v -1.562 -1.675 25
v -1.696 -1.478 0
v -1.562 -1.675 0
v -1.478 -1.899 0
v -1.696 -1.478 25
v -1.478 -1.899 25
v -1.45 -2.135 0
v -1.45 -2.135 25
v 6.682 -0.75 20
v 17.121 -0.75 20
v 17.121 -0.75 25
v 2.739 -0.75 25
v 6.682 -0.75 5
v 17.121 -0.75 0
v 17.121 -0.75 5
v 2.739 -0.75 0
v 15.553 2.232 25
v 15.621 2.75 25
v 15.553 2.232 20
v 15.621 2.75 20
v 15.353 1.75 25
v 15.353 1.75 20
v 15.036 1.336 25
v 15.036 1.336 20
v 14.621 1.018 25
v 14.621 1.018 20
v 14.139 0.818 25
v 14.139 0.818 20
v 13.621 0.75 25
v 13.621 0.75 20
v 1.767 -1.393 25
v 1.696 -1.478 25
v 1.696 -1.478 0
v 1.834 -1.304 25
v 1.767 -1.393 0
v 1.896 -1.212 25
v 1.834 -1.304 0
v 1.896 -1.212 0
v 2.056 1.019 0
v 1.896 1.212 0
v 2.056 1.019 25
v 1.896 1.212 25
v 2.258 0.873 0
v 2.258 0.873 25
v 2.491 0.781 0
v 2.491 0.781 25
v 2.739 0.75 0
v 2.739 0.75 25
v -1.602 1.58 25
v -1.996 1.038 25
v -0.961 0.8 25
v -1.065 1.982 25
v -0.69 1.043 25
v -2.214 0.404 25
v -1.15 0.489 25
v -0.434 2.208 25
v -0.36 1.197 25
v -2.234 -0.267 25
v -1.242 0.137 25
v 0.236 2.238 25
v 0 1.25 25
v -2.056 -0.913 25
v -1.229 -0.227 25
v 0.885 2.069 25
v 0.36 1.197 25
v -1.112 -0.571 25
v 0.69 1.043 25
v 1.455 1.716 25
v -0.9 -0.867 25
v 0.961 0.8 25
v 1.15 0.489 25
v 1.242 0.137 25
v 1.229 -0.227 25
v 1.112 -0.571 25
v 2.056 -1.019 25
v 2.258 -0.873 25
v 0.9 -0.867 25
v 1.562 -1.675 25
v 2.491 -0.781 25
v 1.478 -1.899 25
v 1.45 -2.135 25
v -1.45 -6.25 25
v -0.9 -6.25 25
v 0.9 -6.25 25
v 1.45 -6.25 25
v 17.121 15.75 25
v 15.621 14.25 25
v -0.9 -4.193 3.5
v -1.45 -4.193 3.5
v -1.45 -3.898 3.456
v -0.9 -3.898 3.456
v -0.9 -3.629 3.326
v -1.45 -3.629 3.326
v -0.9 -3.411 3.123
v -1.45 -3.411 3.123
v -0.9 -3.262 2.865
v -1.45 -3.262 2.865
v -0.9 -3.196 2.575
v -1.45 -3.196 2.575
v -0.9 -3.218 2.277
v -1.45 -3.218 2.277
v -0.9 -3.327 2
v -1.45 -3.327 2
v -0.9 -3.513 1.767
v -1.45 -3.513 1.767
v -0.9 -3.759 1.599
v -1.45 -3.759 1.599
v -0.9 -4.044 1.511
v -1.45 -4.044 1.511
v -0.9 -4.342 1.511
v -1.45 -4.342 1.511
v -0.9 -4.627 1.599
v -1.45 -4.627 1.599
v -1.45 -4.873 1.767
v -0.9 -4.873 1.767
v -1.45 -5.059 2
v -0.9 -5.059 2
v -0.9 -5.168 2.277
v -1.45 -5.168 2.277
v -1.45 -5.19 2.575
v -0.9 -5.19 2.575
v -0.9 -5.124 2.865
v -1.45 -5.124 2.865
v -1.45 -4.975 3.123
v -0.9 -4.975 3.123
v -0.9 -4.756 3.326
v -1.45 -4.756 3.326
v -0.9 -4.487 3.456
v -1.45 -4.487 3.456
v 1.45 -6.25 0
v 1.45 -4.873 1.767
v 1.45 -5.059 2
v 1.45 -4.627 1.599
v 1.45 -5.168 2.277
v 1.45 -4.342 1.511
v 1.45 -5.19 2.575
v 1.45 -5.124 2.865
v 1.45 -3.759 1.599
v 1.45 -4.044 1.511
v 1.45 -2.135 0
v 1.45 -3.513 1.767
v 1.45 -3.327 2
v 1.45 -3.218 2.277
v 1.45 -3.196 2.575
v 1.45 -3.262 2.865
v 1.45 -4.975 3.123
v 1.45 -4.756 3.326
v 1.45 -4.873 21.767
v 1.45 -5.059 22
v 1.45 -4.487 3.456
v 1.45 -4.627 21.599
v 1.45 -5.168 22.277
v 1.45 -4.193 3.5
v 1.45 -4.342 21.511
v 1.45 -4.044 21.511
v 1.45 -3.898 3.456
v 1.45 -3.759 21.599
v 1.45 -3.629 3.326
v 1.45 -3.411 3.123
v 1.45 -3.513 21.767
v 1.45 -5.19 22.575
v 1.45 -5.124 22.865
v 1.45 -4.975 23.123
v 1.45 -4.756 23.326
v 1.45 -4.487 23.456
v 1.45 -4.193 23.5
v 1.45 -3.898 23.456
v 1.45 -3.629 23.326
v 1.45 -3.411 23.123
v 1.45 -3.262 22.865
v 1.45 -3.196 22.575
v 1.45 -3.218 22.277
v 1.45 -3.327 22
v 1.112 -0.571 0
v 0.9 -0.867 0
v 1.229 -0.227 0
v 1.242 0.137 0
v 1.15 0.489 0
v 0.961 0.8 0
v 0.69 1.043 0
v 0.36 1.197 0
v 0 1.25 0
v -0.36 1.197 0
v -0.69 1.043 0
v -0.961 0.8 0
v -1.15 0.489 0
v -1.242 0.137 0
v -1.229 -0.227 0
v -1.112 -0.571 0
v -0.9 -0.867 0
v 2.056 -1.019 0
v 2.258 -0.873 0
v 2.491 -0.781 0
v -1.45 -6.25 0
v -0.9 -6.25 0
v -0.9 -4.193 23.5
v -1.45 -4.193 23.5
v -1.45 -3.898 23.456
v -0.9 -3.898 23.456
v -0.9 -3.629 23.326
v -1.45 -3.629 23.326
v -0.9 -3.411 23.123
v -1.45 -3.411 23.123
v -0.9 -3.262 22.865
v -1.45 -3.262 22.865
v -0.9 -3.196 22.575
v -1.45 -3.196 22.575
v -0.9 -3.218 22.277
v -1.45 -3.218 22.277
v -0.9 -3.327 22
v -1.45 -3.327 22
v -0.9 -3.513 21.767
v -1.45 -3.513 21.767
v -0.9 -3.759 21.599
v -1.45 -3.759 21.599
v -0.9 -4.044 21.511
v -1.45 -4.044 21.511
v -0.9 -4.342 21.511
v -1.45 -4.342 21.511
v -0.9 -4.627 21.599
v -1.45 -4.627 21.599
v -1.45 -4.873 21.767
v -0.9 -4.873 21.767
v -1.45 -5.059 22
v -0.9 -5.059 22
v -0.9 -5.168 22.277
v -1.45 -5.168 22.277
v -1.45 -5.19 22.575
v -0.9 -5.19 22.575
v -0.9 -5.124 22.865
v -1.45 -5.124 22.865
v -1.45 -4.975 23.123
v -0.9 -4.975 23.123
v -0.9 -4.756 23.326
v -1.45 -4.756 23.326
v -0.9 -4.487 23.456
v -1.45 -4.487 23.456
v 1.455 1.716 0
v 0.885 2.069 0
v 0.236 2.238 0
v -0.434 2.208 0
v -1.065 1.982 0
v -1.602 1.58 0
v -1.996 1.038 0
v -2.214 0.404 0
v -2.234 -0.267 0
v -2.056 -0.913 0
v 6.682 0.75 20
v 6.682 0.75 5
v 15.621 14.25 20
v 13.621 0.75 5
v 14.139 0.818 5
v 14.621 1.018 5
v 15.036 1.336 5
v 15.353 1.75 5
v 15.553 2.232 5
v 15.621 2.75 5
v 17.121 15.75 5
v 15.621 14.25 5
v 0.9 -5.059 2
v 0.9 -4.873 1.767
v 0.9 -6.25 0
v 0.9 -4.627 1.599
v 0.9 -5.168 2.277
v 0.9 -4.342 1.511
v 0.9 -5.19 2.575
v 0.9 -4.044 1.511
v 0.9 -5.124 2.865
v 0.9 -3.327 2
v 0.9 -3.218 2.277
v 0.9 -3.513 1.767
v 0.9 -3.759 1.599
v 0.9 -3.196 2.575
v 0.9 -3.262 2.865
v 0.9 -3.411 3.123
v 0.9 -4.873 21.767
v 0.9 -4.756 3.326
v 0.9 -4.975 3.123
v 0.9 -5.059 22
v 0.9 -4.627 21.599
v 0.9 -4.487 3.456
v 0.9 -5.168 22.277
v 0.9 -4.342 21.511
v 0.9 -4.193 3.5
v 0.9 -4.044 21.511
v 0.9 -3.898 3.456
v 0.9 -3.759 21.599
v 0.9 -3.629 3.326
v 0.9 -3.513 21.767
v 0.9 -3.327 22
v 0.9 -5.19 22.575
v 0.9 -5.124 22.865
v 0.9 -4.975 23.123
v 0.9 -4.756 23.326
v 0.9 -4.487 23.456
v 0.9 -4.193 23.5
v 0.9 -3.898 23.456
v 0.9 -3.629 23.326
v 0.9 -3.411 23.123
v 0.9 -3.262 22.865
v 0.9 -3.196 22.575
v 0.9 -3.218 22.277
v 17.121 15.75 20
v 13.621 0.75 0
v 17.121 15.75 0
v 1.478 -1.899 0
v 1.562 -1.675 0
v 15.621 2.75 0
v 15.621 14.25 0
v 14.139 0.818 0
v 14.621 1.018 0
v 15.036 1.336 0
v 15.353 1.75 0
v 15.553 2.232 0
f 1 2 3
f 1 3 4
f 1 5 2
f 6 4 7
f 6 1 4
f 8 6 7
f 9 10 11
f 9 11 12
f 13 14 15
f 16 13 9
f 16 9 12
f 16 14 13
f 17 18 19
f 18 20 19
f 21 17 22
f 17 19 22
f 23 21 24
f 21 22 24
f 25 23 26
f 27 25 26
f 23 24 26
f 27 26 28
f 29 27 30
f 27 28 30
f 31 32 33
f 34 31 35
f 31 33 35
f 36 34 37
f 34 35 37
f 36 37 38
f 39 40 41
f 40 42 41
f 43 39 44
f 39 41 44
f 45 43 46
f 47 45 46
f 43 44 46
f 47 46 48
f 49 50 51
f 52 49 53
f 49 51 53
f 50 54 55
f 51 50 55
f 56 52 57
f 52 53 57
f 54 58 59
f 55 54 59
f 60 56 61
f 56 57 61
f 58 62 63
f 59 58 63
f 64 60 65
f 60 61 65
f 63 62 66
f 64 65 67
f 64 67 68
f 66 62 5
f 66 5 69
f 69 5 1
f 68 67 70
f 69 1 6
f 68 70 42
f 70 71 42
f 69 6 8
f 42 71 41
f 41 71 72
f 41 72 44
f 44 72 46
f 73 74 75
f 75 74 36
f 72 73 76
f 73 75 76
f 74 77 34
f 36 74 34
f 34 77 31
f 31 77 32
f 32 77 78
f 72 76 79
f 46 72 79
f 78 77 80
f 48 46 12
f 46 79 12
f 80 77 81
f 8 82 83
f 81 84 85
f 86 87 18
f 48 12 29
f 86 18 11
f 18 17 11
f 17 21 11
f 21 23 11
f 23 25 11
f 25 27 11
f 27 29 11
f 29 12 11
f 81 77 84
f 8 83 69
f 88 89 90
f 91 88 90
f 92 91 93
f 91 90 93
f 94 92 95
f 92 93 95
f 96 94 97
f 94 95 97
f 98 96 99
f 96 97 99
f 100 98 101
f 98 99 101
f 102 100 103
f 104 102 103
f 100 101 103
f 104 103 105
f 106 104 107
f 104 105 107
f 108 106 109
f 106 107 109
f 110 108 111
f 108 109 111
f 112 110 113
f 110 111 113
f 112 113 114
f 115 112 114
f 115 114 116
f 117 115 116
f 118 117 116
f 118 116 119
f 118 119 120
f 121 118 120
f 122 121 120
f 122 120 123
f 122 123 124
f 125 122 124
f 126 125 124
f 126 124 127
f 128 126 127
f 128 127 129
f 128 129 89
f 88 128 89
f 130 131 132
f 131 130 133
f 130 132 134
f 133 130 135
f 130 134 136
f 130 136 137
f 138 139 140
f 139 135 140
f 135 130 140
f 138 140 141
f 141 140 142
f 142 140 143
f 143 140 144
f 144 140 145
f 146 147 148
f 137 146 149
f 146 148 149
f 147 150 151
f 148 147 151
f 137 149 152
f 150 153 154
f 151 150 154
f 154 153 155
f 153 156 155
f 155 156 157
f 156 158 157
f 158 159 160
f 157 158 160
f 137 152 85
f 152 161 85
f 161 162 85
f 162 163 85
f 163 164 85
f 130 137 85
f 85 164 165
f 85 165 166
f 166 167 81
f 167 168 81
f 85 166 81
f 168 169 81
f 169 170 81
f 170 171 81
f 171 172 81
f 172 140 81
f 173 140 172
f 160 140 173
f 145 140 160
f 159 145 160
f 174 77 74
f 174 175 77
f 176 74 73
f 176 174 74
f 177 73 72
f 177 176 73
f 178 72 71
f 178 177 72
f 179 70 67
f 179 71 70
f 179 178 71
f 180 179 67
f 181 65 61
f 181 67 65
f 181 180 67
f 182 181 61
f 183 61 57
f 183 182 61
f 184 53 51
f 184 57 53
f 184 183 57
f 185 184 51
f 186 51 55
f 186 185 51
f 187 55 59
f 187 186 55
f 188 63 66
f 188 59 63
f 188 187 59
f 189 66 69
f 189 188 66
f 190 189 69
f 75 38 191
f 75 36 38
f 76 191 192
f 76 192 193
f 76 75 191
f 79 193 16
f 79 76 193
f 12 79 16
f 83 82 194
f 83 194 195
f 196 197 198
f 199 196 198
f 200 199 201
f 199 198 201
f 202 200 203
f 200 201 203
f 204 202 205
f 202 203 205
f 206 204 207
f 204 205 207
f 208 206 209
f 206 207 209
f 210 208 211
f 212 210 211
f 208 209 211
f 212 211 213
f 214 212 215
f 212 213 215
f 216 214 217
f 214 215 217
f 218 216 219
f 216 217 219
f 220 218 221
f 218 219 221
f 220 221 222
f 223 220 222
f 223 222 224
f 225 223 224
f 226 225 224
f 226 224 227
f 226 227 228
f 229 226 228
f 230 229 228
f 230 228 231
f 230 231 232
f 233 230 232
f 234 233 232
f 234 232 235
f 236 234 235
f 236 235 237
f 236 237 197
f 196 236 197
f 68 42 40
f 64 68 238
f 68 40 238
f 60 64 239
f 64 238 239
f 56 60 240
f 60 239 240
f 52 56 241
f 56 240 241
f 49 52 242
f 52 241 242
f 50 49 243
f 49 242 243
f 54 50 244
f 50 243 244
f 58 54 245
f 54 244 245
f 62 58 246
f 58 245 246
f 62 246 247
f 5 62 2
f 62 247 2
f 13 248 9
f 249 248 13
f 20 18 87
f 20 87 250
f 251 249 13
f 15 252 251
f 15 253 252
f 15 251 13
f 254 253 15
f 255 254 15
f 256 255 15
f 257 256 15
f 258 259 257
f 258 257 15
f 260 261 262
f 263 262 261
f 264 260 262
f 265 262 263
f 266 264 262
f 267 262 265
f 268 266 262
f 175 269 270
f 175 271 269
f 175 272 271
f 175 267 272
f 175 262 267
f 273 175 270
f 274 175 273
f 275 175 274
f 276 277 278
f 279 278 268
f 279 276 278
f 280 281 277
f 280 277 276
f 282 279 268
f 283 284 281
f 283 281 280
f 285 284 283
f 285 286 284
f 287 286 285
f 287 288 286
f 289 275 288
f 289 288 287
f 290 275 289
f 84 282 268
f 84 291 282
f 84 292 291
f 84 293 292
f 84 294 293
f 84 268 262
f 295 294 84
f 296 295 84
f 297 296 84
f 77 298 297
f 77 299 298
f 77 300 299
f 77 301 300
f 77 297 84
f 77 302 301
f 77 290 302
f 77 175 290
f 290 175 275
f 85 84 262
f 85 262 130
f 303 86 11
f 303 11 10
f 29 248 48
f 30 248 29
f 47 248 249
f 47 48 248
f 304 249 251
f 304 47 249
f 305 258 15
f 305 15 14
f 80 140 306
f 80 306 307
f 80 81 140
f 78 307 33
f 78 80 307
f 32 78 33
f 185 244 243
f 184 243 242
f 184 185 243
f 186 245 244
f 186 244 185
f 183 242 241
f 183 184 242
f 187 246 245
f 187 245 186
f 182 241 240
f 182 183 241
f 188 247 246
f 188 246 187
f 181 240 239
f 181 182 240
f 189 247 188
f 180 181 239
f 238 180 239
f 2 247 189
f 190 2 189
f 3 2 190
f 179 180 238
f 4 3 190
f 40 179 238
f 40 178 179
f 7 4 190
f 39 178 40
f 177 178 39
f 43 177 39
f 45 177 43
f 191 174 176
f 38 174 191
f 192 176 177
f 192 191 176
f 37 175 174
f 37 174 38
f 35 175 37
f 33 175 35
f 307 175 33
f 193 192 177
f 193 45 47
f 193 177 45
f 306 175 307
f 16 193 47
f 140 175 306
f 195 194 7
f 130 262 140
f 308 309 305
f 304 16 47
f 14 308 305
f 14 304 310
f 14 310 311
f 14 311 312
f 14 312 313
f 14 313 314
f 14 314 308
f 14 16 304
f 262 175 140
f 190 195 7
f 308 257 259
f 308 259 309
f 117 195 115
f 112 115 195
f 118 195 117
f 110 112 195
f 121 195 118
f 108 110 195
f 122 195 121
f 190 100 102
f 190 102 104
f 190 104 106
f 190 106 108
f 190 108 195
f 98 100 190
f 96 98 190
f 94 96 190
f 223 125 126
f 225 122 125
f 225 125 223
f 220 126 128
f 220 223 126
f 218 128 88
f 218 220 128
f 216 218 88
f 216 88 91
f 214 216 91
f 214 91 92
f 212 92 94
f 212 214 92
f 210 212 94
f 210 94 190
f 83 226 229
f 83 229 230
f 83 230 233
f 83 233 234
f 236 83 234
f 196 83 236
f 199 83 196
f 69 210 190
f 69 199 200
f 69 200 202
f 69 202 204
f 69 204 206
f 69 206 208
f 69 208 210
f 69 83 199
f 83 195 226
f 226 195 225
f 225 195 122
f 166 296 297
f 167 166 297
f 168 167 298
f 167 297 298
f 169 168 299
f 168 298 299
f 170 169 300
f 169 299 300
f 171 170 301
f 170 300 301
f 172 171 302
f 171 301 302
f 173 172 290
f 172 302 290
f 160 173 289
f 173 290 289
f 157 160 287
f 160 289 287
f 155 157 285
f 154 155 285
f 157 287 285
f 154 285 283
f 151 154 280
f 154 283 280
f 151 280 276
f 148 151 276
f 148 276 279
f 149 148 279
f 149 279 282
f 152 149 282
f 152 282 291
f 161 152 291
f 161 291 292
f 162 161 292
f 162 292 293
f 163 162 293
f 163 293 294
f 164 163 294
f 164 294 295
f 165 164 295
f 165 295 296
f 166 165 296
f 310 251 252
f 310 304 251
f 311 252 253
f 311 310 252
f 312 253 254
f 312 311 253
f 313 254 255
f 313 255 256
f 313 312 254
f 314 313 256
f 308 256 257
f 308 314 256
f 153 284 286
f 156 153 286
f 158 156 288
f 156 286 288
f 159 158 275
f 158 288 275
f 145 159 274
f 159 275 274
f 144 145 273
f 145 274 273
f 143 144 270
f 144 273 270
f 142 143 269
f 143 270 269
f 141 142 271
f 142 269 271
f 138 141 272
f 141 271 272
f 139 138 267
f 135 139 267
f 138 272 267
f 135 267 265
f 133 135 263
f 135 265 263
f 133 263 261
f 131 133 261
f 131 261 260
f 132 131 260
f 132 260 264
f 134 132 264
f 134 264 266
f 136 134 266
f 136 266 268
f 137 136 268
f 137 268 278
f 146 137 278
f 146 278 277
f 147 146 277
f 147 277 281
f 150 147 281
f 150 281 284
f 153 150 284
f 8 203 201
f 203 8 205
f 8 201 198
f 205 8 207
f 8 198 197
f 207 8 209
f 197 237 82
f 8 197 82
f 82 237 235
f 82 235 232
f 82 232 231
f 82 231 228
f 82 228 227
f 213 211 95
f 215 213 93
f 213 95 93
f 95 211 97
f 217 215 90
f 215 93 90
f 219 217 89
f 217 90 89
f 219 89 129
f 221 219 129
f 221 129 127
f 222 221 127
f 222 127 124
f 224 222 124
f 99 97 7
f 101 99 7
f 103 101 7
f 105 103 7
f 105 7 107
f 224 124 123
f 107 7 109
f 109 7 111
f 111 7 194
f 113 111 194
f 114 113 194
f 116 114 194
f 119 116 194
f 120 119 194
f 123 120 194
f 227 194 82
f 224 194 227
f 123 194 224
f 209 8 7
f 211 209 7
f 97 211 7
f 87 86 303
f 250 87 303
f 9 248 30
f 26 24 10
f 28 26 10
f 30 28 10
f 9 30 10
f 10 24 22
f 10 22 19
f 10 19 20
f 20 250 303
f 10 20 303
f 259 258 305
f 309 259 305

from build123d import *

# Parameters (mm, degrees)
SKETCH_1_R          = 2.25
SKETCH_1_R_2        = 1.25
EXTRUDE_1_DEPTH     = 25
EXTRUDE_START       = -25
EXTRUDE_2_DEPTH     = 25
CUT_EXTRUDE_1_DEPTH = 25
SKETCH_4_W          = 0.55
SKETCH_4_H          = 25
EXTRUDE_3_DEPTH     = 2
EXTRUDE_4_DEPTH     = 25
FILLET_1_R          = 1
SKETCH_6_W          = 1.5
SKETCH_6_H          = 25
EXTRUDE_6_DEPTH     = 15
SKETCH_7_W          = 17.879358453
SKETCH_7_H          = 15
CUT_EXTRUDE_2_DEPTH = 50
FILLET_2_R          = 2
SKETCH_8_R          = 1
CUT_EXTRUDE_3_DEPTH = 10
CHAMFER_1_SIZE      = 1.5


with BuildPart() as part:
    # 草图1 → 凸台-拉伸1 (new body)
    with BuildSketch(Plane.XY):
        Circle(SKETCH_1_R)
        Circle(SKETCH_1_R_2, mode=Mode.SUBTRACT)
    extrude(amount=EXTRUDE_1_DEPTH)

    # 草图2 → 凸台-拉伸2 (add)
    with BuildSketch(Plane.XY.offset(25).offset(EXTRUDE_START)):
        with BuildLine():
            Line((-0.9, -4.25), (-0.9, -2.062159063))
            ThreePointArc((-0.9, -2.062159063), (-1.187355759, -1.911200225), (-1.45, -1.720465053))
            Line((-1.45, -1.720465053), (-1.45, -4.25))
            Line((-1.45, -4.25), (-0.9, -4.25))
        make_face()
        with BuildLine():
            ThreePointArc((1.45, -1.720465053), (1.187355759, -1.911200225), (0.9, -2.062159063))
            Line((0.9, -2.062159063), (0.9, -4.25))
            Line((0.9, -4.25), (1.45, -4.25))
            Line((1.45, -4.25), (1.45, -1.720465053))
        make_face()
    extrude(amount=EXTRUDE_2_DEPTH)

    # 草图3 → 切除-拉伸1 (cut)
    with BuildSketch(Plane.XY.offset(25)):
        Polygon((-0.9, -2.062159063), (-0.9, -0.608172981), (0.9, -0.572608175), (0.9, -2.062159063), (-0.22034315, -2.711539451), align=None)
    extrude(amount=-CUT_EXTRUDE_1_DEPTH, mode=Mode.SUBTRACT)

    # 草图4 → 凸台-拉伸3 (add)
    with BuildSketch(Plane.XZ.offset(4.25)):
        with Locations((1.175, 12.5)):
            Rectangle(SKETCH_4_W, SKETCH_4_H)
        with Locations((-1.175, 12.5)):
            Rectangle(SKETCH_4_W, SKETCH_4_H)
    extrude(amount=EXTRUDE_3_DEPTH)

    # 草图5 → 凸台-拉伸4 (add)
    with BuildSketch(Plane.XY.offset(25).offset(EXTRUDE_START)):
        with BuildLine():
            Line((2.121320344, 0.75), (17.121320344, 0.75))
            Line((17.121320344, 0.75), (17.121320344, -0.75))
            Line((17.121320344, -0.75), (2.121320344, -0.75))
            ThreePointArc((2.121320344, -0.75), (2.25, 0), (2.121320344, 0.75))
        make_face()
    extrude(amount=EXTRUDE_4_DEPTH)

    # 圆角1
    fillet_1_edges = [part.edges().sort_by_distance(p)[0] for p in [
        (-1.45, -1.720465053, 12.5),
        (1.45, -1.720465053, 12.5),
        (2.121320344, -0.75, 12.5),
        (2.121320344, 0.75, 12.5),
    ]]
    fillet(fillet_1_edges, radius=FILLET_1_R)

    # 草图6 → 凸台-拉伸6 (add)
    with BuildSketch(Plane(origin=(0, 0.75, 0), x_dir=(1, 0, 0), z_dir=(0, 1, 0))):
        with Locations((16.371320344, -12.5)):
            Rectangle(SKETCH_6_W, SKETCH_6_H)
    extrude(amount=EXTRUDE_6_DEPTH)

    # 草图7 → 切除-拉伸2 (cut, symmetric)
    with BuildSketch(Plane(origin=(0, 0.75, 0), x_dir=(1, 0, 0), z_dir=(0, 1, 0))):
        with Locations((15.621320344, -12.5)):
            Rectangle(SKETCH_7_W, SKETCH_7_H)
    extrude(amount=CUT_EXTRUDE_2_DEPTH, both=True, mode=Mode.SUBTRACT)

    # 圆角2
    fillet_2_edges = [part.edges().sort_by_distance(p)[0] for p in [
        (15.621320344, 0.75, 2.5),
        (15.621320344, 0.75, 22.5),
    ]]
    fillet(fillet_2_edges, radius=FILLET_2_R)

    # 草图8 → 切除-拉伸3 (cut)
    with BuildSketch(Plane.ZY.offset(1.45)):
        with Locations((2.5, -4.192707825)):
            Circle(SKETCH_8_R)
        with Locations((22.5, -4.192707825)):
            Circle(SKETCH_8_R)
    extrude(amount=-CUT_EXTRUDE_3_DEPTH, mode=Mode.SUBTRACT)

    # 倒角1
    chamfer_1_edges = [part.edges().sort_by_distance(p)[0] for p in [
        (15.621320344, 15.75, 2.5),
        (15.621320344, 15.75, 22.5),
    ]]
    chamfer(chamfer_1_edges, length=CHAMFER_1_SIZE - 0.0001)  # a hair under: the kernel refuses the full size


solid = part.part
